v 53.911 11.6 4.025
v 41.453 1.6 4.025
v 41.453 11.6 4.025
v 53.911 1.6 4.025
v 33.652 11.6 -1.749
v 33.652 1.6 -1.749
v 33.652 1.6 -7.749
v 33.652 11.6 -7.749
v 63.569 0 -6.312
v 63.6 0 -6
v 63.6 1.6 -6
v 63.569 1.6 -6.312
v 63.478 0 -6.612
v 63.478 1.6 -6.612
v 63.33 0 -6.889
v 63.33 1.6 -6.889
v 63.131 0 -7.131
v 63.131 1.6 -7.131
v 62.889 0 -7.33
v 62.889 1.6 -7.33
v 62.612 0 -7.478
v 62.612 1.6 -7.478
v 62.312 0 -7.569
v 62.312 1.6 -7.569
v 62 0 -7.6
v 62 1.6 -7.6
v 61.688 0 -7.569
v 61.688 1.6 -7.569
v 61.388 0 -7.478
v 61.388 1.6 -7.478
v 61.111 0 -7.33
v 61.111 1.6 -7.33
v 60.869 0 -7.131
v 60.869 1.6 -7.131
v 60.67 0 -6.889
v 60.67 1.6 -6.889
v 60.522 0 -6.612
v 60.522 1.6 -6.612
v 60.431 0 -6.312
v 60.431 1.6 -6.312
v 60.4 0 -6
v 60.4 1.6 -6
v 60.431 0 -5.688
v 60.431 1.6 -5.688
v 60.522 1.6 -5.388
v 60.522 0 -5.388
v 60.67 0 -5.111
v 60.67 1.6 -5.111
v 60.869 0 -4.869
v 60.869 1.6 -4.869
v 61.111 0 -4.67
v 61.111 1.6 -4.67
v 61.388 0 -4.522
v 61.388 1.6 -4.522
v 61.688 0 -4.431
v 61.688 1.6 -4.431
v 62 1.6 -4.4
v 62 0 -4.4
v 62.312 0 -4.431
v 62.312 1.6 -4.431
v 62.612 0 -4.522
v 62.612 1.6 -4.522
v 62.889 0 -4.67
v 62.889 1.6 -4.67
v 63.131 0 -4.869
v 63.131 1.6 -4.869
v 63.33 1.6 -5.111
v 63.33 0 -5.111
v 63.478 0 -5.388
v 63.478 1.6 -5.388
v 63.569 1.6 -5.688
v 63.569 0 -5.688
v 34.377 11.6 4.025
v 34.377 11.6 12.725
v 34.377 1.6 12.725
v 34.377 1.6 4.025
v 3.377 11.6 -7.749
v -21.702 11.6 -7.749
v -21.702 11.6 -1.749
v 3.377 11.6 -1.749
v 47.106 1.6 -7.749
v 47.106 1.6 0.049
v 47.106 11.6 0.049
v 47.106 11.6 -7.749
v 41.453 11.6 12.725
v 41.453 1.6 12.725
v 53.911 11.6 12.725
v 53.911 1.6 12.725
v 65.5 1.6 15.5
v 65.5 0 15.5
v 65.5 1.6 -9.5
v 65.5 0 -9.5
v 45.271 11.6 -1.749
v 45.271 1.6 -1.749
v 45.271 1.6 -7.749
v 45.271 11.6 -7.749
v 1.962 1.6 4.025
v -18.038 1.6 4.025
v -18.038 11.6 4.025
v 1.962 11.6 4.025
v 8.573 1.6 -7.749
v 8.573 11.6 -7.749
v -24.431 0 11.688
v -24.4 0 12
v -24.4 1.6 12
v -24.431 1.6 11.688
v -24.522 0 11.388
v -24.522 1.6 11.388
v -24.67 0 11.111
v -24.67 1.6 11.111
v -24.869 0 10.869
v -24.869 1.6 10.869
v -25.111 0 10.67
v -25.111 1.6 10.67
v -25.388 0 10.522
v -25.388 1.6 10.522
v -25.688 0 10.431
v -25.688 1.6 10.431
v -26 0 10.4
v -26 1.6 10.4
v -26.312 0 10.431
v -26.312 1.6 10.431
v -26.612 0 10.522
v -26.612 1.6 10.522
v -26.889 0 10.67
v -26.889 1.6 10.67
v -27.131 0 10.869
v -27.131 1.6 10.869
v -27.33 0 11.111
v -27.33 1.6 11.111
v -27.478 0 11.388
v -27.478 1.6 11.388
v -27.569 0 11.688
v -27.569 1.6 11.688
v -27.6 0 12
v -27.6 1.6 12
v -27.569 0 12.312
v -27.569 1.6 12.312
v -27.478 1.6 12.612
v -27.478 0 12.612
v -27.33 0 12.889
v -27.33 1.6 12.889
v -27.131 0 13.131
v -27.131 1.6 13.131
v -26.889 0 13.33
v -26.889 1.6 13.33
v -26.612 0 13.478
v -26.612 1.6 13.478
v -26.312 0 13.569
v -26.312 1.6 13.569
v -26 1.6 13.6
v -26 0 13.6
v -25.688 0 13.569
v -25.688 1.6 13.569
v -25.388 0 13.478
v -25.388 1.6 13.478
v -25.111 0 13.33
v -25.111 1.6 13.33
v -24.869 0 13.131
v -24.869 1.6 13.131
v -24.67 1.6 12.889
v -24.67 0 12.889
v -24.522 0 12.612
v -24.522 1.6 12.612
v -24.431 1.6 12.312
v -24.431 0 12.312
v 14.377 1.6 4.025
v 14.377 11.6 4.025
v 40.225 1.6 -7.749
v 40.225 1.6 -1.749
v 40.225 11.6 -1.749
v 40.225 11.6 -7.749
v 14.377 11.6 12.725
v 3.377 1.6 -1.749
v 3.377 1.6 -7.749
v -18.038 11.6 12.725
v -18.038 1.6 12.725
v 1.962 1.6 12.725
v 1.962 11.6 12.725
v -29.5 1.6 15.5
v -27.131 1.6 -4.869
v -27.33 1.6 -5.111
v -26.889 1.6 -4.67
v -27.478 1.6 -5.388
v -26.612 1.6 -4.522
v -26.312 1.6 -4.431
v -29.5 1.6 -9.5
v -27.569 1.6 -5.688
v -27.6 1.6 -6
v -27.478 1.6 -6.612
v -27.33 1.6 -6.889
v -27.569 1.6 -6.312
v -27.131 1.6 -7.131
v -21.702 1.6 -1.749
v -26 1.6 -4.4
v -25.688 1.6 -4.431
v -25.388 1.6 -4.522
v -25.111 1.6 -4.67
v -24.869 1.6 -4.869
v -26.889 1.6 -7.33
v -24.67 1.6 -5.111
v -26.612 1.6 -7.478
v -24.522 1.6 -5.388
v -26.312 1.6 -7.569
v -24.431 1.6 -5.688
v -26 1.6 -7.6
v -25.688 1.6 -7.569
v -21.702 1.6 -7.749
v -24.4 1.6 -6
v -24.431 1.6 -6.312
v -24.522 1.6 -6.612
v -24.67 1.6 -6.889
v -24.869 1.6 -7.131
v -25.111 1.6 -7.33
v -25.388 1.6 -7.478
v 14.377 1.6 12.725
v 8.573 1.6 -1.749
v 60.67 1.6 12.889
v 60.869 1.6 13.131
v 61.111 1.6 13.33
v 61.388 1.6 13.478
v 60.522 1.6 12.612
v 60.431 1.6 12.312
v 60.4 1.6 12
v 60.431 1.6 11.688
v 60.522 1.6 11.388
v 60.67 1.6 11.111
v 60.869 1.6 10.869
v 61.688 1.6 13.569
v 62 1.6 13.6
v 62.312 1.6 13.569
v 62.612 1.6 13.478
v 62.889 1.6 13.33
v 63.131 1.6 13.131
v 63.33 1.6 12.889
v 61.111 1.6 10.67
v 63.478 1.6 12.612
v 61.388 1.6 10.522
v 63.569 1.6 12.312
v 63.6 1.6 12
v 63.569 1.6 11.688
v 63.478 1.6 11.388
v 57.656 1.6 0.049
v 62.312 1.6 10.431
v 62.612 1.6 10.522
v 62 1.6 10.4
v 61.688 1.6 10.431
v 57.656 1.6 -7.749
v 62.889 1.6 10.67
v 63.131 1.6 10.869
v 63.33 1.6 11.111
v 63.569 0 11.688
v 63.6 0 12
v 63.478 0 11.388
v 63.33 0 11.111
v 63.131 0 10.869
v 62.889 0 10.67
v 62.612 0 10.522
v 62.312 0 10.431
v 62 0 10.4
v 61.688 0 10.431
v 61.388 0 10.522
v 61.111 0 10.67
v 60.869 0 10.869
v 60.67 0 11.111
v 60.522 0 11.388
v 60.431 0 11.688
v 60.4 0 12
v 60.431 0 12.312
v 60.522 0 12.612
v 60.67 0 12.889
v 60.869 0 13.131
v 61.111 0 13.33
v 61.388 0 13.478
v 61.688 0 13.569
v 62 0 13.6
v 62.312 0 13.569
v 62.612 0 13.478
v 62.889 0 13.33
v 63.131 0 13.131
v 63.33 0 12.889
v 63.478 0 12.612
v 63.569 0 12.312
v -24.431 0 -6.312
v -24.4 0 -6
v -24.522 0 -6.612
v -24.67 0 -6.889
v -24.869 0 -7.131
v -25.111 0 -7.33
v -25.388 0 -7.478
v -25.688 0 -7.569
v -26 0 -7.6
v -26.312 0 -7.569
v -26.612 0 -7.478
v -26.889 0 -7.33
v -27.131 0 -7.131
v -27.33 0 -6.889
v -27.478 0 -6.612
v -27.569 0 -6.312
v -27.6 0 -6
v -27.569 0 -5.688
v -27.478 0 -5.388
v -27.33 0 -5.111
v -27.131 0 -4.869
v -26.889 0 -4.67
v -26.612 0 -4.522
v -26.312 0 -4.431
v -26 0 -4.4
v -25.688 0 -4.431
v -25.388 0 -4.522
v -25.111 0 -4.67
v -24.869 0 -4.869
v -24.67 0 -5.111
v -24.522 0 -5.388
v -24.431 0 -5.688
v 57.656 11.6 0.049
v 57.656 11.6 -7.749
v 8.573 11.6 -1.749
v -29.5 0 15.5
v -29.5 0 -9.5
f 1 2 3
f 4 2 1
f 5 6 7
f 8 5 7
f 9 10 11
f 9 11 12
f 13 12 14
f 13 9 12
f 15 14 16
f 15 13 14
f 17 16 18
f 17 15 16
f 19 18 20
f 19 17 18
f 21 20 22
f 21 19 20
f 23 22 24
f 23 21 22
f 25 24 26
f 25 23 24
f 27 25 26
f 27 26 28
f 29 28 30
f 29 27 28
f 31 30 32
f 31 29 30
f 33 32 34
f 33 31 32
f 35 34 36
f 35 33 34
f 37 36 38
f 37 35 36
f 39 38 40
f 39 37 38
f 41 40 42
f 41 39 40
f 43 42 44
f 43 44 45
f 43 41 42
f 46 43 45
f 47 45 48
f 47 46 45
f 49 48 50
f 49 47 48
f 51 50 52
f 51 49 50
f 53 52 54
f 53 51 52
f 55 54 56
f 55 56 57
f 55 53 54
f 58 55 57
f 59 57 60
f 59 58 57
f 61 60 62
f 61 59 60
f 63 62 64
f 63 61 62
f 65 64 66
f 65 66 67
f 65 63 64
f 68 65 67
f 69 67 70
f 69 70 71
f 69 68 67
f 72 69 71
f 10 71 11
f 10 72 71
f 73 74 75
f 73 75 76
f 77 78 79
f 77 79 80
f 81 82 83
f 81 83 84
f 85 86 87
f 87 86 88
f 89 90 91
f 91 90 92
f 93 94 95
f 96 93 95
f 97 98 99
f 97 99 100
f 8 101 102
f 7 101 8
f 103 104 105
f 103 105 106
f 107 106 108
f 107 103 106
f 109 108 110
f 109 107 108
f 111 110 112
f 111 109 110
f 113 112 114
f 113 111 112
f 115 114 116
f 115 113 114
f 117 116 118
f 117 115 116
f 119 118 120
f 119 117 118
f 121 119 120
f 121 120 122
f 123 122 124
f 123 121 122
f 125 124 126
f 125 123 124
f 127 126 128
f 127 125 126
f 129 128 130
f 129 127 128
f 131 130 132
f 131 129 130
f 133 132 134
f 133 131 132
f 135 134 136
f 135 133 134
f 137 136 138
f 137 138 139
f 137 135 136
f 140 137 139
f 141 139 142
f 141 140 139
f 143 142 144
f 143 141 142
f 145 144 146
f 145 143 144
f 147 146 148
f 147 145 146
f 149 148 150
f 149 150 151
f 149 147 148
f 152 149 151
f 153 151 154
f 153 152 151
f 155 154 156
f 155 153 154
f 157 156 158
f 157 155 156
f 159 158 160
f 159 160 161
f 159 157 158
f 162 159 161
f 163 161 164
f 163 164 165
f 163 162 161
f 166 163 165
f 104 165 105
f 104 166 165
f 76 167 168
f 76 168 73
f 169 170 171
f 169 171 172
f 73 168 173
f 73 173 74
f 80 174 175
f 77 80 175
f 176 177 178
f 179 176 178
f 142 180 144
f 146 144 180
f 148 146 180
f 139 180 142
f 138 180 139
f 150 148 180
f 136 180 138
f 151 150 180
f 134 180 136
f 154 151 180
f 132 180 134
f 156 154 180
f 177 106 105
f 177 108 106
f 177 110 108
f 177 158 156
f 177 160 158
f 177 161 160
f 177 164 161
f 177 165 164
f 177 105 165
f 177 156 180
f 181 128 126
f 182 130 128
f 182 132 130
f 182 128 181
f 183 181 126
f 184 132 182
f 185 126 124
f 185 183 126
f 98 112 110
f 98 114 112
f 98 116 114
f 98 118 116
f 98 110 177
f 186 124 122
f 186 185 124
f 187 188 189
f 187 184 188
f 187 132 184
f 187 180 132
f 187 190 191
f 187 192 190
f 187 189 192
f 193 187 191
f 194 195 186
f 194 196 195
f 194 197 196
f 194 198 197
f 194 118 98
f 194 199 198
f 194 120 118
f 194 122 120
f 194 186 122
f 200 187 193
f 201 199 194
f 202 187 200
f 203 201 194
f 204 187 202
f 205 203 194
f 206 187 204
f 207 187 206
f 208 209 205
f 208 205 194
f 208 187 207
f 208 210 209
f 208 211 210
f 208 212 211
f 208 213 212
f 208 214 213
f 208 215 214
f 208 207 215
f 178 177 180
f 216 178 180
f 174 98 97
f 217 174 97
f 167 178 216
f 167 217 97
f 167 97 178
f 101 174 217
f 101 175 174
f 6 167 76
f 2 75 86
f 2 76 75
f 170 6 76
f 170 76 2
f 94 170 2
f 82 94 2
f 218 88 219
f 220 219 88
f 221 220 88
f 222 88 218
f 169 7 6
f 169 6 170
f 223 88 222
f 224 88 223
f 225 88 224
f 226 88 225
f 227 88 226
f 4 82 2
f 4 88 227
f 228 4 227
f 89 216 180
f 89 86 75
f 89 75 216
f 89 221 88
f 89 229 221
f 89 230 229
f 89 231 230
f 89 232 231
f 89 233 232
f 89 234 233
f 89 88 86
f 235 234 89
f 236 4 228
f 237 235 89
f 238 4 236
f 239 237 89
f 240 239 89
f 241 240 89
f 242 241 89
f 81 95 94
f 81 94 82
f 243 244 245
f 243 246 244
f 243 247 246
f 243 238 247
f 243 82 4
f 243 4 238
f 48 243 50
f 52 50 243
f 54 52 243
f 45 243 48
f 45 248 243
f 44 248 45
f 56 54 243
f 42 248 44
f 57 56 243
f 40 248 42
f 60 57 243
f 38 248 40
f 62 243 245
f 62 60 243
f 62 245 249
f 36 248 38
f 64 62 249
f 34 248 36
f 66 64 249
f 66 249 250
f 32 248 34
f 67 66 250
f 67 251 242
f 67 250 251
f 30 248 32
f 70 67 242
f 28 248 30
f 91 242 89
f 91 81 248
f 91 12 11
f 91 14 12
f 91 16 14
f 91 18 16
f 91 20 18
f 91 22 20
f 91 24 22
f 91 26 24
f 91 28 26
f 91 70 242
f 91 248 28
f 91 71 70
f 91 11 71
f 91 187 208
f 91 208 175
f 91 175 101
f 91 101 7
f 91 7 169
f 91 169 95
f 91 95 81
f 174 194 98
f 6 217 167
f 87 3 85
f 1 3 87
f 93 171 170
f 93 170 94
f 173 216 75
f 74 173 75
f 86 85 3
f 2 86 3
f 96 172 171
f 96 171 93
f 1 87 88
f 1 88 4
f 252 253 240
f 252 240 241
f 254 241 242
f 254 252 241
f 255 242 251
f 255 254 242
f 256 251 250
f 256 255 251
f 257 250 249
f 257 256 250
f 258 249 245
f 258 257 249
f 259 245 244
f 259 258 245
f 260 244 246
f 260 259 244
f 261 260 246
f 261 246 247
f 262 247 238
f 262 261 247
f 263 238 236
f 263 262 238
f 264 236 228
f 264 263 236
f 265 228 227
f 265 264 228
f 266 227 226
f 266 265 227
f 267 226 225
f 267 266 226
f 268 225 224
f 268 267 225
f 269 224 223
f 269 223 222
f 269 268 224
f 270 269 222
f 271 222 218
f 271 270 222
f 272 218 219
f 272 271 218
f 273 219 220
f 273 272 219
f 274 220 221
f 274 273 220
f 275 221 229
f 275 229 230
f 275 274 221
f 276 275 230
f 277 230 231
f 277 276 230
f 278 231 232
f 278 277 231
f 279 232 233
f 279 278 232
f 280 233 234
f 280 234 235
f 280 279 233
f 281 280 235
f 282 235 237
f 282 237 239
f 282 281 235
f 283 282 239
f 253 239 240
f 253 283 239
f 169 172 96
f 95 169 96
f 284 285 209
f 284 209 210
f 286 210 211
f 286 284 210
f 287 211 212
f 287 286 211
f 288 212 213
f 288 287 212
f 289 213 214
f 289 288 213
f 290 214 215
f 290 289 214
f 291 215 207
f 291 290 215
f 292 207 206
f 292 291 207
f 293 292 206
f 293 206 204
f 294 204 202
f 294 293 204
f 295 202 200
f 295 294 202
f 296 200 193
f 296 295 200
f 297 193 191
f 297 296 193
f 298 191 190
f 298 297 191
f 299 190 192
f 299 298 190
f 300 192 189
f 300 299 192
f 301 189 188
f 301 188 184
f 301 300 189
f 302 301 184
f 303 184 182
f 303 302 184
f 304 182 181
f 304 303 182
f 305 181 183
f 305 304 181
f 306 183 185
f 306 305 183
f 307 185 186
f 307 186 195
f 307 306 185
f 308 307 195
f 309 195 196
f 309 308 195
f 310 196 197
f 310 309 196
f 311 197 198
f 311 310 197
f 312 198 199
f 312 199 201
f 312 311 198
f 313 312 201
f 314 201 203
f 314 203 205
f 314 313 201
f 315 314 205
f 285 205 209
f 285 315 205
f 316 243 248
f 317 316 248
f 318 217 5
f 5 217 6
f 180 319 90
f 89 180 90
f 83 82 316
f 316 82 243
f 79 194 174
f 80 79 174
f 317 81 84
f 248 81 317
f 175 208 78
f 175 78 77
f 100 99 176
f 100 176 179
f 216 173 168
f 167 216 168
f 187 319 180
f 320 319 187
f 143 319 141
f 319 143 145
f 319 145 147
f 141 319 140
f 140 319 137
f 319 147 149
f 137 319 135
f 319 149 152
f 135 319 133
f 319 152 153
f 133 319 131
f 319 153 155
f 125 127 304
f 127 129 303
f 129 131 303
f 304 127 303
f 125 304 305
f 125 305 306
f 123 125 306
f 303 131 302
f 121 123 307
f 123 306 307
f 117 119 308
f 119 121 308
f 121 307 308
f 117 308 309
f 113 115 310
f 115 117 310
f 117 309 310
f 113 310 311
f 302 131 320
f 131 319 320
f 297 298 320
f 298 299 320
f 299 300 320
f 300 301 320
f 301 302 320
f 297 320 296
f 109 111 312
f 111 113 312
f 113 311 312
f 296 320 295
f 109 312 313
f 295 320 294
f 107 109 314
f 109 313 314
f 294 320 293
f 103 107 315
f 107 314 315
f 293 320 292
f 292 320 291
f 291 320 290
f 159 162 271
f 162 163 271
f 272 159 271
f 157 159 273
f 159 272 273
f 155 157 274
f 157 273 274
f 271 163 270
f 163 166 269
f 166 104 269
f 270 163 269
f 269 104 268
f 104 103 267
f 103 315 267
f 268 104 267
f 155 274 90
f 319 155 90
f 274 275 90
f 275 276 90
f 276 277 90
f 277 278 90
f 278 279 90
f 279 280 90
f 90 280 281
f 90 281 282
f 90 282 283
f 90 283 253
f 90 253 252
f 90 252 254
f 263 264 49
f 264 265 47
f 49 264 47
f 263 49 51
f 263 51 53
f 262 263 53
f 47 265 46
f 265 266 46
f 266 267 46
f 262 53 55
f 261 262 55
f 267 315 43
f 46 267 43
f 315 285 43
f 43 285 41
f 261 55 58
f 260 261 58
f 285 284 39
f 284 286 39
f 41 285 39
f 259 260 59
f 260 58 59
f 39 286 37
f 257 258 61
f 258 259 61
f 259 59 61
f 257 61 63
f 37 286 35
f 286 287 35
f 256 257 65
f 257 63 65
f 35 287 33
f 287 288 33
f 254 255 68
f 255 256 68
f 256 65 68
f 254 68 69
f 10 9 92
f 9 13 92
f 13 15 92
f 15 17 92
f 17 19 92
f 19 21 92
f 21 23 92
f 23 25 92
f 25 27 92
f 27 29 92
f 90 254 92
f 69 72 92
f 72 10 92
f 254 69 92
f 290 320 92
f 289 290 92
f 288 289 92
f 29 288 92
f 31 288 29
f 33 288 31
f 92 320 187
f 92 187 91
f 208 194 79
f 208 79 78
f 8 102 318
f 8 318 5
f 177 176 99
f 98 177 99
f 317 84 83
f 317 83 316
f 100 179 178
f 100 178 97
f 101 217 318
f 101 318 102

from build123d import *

# Parameters (mm, degrees)
SKETCH1_W           = 95
SKETCH1_H           = 25
SKETCH1_R           = 1.6
BOSS_EXTRUDE1_DEPTH = 1.6
SKETCH2_W           = 25.078547191
SKETCH2_H           = 6
SKETCH2_W_2         = 25.078547192
SKETCH2_W_3         = 5.04587156
SKETCH2_W_4         = 20
SKETCH2_H_2         = 8.7
SKETCH2_W_5         = 10.550458716
SKETCH2_H_3         = 7.798165138
SKETCH2_W_6         = 12.457684798
BOSS_EXTRUDE2_DEPTH = 10


with BuildPart() as part:
    # Sketch1 → Boss-Extrude1 (new body)
    with BuildSketch(Plane(origin=(0, 0, 0), x_dir=(1, 0, 0), z_dir=(0, 1, 0))):
        with Locations((18, -3)):
            Rectangle(SKETCH1_W, SKETCH1_H)
        with Locations((-26, 6)):
            Circle(SKETCH1_R, mode=Mode.SUBTRACT)
        with Locations((62, 6)):
            Circle(SKETCH1_R, mode=Mode.SUBTRACT)
        with Locations((62, -12)):
            Circle(SKETCH1_R, mode=Mode.SUBTRACT)
        with Locations((-26, -12)):
            Circle(SKETCH1_R, mode=Mode.SUBTRACT)
    extrude(amount=BOSS_EXTRUDE1_DEPTH)

    # Sketch2 → Boss-Extrude2 (add)
    with BuildSketch(Plane(origin=(0, 1.6, 0), x_dir=(1, 0, 0), z_dir=(0, 1, 0))):
        with Locations((-9.162561267, 4.749179336)):
            Rectangle(SKETCH2_W, SKETCH2_H)
        with Locations((21.112668091, 4.749179336)):
            Rectangle(SKETCH2_W_2, SKETCH2_H)
        with Locations((42.747706422, 4.749179336)):
            Rectangle(SKETCH2_W_3, SKETCH2_H)
        with Locations((-8.038302451, -8.374621296)):
            Rectangle(SKETCH2_W_4, SKETCH2_H_2)
        with Locations((52.380733945, 3.850096767)):
            Rectangle(SKETCH2_W_5, SKETCH2_H_3)
        with Locations((47.682340819, -8.374621296)):
            Rectangle(SKETCH2_W_6, SKETCH2_H_2)
        with Locations((24.37710187, -8.374621296)):
            Rectangle(SKETCH2_W_4, SKETCH2_H_2)
    extrude(amount=BOSS_EXTRUDE2_DEPTH)


solid = part.part
